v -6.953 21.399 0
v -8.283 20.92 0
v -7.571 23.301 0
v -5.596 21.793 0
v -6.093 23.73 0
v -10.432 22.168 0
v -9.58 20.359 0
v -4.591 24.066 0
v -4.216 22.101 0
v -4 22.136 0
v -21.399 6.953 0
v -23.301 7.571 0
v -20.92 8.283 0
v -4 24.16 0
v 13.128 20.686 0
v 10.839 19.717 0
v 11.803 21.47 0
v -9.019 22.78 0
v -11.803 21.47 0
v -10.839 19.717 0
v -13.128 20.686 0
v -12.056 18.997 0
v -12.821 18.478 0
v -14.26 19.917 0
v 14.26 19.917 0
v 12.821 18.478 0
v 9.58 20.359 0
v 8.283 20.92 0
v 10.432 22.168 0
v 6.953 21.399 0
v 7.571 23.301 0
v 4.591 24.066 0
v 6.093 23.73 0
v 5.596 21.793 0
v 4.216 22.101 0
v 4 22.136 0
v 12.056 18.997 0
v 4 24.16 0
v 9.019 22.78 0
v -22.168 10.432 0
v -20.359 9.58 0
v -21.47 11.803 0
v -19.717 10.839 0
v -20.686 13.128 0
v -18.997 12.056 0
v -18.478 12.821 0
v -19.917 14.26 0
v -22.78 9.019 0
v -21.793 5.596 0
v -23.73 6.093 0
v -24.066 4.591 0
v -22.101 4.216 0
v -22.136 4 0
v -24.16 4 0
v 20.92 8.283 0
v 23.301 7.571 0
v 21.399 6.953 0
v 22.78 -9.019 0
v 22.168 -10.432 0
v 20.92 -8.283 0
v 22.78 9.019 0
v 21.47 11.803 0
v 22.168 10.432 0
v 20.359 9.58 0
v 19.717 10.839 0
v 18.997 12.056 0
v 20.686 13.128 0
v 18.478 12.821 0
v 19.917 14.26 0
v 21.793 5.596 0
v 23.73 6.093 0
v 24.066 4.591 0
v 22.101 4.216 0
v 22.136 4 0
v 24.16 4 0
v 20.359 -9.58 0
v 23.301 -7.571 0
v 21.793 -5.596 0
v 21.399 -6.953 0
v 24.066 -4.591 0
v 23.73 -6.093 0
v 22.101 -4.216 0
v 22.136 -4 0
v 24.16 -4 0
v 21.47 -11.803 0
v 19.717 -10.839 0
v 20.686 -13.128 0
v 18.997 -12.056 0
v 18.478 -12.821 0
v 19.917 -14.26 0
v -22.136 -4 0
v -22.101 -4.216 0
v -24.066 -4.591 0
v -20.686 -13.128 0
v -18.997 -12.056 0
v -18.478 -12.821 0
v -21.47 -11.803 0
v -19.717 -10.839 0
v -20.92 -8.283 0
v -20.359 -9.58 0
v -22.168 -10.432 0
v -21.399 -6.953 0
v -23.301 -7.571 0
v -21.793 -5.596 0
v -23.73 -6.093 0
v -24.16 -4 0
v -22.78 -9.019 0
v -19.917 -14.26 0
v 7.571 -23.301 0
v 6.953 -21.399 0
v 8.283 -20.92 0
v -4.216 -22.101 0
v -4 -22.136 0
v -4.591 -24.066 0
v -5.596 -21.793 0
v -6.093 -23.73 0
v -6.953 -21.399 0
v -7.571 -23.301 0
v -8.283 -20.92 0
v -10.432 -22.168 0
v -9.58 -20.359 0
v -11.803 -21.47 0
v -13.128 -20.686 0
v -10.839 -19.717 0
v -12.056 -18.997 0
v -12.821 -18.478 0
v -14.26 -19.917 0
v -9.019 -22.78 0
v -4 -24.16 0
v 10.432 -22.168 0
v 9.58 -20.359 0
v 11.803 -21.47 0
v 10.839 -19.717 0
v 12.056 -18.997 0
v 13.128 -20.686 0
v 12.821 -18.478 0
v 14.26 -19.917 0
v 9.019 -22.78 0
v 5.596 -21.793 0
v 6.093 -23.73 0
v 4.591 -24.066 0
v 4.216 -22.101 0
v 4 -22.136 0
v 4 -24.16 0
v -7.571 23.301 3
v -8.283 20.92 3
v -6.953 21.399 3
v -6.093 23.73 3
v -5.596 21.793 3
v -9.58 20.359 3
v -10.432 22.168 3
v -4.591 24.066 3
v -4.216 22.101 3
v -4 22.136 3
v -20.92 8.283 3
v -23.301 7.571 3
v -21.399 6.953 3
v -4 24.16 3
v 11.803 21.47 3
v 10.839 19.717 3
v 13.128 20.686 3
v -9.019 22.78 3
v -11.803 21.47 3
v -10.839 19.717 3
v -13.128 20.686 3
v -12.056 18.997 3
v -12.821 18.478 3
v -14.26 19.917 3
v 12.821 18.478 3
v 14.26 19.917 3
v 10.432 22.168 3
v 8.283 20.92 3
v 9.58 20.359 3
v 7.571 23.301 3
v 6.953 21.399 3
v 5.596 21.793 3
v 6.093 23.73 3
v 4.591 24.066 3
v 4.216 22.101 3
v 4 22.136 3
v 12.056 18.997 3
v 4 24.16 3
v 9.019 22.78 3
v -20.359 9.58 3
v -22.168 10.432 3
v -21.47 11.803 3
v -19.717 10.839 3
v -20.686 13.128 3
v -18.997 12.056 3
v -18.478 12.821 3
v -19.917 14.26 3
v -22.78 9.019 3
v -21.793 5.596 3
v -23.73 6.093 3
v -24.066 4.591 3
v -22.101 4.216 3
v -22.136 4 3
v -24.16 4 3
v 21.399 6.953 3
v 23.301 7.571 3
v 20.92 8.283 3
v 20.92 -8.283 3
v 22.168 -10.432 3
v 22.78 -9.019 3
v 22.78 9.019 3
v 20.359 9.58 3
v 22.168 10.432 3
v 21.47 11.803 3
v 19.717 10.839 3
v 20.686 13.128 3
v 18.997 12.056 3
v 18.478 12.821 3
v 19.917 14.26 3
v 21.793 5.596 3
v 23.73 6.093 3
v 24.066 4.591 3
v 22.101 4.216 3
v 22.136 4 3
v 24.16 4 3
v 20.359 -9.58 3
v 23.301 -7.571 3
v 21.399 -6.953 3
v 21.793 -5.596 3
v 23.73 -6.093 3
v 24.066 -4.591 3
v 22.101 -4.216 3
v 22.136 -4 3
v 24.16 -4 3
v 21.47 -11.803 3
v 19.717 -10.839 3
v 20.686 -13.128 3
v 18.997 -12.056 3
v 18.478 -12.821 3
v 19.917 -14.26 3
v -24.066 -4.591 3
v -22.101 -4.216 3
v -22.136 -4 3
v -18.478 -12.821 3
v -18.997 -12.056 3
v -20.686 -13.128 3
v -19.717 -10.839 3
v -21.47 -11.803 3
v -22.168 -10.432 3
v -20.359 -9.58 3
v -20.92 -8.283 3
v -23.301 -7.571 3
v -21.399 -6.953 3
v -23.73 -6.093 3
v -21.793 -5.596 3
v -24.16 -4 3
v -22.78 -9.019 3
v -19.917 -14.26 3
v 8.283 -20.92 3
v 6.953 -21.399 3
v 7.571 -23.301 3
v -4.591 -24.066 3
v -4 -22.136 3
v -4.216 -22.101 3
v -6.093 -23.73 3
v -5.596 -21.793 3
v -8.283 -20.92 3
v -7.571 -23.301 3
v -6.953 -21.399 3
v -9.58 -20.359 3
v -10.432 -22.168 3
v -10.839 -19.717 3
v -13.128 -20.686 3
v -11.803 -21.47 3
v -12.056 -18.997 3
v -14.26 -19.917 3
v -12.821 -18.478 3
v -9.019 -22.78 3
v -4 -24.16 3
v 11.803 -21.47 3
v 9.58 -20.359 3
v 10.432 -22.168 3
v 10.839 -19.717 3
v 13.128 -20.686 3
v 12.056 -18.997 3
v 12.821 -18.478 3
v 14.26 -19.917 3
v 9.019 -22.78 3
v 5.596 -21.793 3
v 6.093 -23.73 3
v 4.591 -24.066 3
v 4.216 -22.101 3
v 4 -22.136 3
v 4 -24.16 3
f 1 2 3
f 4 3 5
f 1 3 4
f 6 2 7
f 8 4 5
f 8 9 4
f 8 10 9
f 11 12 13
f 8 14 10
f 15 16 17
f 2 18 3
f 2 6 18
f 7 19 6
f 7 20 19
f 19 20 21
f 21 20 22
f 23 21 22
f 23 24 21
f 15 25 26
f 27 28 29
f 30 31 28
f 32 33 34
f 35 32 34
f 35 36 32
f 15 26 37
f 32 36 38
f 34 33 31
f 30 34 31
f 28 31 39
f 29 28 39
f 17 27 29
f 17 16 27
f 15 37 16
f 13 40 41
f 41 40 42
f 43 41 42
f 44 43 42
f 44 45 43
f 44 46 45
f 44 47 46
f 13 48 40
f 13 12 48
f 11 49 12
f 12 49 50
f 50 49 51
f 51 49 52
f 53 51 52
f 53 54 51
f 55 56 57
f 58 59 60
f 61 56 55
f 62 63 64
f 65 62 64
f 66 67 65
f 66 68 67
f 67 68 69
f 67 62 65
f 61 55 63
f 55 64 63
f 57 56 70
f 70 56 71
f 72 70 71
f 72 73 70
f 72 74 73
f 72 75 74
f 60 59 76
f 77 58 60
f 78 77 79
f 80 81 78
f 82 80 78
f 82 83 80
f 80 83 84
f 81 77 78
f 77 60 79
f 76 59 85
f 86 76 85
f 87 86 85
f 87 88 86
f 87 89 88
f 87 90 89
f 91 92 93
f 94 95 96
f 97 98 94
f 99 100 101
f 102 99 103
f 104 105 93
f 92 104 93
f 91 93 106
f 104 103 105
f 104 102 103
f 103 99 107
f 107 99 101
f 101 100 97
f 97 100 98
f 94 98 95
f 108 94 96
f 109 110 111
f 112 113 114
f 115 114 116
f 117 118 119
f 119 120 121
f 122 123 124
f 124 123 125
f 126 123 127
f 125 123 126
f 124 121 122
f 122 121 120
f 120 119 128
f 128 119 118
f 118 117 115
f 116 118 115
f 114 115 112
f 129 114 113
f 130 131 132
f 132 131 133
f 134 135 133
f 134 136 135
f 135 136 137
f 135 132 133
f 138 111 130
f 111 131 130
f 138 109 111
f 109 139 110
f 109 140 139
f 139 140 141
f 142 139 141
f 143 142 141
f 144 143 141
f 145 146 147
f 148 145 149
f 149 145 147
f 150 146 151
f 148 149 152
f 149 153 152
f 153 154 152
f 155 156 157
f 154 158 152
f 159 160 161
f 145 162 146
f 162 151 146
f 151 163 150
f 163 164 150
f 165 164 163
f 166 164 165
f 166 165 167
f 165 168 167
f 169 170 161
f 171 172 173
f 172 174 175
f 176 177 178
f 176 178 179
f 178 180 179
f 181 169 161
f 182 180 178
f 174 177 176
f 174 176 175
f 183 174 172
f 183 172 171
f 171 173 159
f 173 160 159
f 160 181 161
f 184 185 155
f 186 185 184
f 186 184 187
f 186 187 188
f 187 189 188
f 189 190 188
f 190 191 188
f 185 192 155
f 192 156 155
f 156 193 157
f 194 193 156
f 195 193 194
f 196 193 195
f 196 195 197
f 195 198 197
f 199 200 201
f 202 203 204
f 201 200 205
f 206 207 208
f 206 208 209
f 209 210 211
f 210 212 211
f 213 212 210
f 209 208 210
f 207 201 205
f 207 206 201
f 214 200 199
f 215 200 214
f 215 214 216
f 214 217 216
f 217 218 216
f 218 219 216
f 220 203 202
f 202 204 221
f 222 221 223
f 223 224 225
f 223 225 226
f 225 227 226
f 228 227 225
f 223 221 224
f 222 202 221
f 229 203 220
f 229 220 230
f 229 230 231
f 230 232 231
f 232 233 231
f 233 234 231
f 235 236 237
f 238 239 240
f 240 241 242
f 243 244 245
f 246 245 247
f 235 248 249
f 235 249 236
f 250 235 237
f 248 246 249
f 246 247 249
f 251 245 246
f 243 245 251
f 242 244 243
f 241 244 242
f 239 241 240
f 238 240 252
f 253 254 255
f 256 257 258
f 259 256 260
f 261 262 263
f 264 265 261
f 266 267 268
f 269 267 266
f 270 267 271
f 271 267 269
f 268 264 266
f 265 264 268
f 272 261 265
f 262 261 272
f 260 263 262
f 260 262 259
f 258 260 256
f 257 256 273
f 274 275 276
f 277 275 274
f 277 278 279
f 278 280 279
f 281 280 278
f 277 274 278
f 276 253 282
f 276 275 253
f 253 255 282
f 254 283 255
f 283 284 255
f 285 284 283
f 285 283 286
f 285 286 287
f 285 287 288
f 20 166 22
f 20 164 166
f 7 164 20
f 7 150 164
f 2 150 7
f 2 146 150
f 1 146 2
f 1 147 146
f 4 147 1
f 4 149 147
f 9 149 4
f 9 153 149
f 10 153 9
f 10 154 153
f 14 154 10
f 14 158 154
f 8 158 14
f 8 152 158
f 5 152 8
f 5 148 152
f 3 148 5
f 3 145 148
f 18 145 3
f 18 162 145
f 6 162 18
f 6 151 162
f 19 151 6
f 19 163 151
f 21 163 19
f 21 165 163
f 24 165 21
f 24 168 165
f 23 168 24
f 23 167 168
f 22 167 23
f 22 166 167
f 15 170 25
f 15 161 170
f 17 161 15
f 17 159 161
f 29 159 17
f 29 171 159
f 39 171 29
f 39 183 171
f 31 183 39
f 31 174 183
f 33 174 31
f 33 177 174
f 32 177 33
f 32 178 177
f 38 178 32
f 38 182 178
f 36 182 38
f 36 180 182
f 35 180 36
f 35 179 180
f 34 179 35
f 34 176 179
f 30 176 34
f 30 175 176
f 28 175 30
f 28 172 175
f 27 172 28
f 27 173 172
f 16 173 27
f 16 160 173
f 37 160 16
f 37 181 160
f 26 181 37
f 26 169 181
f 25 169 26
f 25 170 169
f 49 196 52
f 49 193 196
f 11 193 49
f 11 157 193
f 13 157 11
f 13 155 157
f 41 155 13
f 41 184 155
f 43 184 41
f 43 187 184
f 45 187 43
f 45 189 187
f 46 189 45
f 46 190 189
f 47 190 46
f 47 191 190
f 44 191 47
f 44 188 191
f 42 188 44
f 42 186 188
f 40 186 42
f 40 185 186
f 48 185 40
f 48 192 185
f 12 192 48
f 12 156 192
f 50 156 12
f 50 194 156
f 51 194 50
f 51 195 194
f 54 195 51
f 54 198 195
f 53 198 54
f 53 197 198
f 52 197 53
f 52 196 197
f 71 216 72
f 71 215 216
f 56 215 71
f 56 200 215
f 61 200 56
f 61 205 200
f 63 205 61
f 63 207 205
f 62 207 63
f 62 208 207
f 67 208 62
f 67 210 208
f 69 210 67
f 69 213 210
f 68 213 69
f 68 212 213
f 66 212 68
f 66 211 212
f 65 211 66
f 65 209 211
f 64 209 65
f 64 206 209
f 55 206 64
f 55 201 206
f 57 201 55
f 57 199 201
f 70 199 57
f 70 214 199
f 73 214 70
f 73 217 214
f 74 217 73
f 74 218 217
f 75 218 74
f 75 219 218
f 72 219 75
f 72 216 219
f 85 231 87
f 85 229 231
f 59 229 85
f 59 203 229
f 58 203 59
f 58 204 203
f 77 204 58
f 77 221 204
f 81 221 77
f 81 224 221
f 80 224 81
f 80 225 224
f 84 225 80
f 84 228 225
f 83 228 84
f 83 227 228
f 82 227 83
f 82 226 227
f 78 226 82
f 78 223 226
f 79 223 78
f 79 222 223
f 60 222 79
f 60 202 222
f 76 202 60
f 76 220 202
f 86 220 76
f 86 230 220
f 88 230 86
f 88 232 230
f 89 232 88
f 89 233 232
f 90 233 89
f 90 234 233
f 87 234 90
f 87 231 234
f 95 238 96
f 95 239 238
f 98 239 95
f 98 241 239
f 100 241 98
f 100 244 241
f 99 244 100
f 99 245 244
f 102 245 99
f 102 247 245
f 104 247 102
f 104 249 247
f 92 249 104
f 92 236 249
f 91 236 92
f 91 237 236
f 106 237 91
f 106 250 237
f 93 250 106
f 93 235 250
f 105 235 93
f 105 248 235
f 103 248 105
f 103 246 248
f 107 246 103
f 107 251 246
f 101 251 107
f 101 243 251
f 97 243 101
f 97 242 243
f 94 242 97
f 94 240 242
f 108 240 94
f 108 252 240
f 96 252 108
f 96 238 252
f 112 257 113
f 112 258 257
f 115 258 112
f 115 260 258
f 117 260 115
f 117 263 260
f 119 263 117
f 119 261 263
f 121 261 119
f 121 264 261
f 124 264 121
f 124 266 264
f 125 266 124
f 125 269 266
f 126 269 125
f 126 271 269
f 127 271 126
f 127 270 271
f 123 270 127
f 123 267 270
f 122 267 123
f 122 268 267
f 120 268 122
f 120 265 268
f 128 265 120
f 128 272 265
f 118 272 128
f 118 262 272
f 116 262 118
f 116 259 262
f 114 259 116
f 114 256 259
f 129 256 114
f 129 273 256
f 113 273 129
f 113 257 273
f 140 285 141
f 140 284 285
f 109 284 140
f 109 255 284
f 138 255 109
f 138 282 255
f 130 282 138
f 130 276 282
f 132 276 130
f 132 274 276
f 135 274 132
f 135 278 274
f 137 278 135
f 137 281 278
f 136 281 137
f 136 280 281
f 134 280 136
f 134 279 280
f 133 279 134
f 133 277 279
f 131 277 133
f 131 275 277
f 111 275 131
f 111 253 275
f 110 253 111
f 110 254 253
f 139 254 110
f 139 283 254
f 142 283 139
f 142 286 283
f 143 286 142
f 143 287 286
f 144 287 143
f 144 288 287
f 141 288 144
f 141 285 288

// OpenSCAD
$fn = 100;
outer_dia = 2*24.5;
foot_width = 2;
inner_dia = outer_dia - 2*foot_width;

cutout_width = 8;
cutout_count = 8;
height = 3;

linear_extrude(height)
difference()
{
    circle(inner_dia/2 + foot_width);
    circle(inner_dia/2);
    for(i=[1:cutout_count])
    {
	rotate([0,0,(i-1)*(360 / cutout_count)])
	translate([-cutout_width/2, inner_dia/2 - 1])
	square([cutout_width, foot_width*2]);
    }
}
